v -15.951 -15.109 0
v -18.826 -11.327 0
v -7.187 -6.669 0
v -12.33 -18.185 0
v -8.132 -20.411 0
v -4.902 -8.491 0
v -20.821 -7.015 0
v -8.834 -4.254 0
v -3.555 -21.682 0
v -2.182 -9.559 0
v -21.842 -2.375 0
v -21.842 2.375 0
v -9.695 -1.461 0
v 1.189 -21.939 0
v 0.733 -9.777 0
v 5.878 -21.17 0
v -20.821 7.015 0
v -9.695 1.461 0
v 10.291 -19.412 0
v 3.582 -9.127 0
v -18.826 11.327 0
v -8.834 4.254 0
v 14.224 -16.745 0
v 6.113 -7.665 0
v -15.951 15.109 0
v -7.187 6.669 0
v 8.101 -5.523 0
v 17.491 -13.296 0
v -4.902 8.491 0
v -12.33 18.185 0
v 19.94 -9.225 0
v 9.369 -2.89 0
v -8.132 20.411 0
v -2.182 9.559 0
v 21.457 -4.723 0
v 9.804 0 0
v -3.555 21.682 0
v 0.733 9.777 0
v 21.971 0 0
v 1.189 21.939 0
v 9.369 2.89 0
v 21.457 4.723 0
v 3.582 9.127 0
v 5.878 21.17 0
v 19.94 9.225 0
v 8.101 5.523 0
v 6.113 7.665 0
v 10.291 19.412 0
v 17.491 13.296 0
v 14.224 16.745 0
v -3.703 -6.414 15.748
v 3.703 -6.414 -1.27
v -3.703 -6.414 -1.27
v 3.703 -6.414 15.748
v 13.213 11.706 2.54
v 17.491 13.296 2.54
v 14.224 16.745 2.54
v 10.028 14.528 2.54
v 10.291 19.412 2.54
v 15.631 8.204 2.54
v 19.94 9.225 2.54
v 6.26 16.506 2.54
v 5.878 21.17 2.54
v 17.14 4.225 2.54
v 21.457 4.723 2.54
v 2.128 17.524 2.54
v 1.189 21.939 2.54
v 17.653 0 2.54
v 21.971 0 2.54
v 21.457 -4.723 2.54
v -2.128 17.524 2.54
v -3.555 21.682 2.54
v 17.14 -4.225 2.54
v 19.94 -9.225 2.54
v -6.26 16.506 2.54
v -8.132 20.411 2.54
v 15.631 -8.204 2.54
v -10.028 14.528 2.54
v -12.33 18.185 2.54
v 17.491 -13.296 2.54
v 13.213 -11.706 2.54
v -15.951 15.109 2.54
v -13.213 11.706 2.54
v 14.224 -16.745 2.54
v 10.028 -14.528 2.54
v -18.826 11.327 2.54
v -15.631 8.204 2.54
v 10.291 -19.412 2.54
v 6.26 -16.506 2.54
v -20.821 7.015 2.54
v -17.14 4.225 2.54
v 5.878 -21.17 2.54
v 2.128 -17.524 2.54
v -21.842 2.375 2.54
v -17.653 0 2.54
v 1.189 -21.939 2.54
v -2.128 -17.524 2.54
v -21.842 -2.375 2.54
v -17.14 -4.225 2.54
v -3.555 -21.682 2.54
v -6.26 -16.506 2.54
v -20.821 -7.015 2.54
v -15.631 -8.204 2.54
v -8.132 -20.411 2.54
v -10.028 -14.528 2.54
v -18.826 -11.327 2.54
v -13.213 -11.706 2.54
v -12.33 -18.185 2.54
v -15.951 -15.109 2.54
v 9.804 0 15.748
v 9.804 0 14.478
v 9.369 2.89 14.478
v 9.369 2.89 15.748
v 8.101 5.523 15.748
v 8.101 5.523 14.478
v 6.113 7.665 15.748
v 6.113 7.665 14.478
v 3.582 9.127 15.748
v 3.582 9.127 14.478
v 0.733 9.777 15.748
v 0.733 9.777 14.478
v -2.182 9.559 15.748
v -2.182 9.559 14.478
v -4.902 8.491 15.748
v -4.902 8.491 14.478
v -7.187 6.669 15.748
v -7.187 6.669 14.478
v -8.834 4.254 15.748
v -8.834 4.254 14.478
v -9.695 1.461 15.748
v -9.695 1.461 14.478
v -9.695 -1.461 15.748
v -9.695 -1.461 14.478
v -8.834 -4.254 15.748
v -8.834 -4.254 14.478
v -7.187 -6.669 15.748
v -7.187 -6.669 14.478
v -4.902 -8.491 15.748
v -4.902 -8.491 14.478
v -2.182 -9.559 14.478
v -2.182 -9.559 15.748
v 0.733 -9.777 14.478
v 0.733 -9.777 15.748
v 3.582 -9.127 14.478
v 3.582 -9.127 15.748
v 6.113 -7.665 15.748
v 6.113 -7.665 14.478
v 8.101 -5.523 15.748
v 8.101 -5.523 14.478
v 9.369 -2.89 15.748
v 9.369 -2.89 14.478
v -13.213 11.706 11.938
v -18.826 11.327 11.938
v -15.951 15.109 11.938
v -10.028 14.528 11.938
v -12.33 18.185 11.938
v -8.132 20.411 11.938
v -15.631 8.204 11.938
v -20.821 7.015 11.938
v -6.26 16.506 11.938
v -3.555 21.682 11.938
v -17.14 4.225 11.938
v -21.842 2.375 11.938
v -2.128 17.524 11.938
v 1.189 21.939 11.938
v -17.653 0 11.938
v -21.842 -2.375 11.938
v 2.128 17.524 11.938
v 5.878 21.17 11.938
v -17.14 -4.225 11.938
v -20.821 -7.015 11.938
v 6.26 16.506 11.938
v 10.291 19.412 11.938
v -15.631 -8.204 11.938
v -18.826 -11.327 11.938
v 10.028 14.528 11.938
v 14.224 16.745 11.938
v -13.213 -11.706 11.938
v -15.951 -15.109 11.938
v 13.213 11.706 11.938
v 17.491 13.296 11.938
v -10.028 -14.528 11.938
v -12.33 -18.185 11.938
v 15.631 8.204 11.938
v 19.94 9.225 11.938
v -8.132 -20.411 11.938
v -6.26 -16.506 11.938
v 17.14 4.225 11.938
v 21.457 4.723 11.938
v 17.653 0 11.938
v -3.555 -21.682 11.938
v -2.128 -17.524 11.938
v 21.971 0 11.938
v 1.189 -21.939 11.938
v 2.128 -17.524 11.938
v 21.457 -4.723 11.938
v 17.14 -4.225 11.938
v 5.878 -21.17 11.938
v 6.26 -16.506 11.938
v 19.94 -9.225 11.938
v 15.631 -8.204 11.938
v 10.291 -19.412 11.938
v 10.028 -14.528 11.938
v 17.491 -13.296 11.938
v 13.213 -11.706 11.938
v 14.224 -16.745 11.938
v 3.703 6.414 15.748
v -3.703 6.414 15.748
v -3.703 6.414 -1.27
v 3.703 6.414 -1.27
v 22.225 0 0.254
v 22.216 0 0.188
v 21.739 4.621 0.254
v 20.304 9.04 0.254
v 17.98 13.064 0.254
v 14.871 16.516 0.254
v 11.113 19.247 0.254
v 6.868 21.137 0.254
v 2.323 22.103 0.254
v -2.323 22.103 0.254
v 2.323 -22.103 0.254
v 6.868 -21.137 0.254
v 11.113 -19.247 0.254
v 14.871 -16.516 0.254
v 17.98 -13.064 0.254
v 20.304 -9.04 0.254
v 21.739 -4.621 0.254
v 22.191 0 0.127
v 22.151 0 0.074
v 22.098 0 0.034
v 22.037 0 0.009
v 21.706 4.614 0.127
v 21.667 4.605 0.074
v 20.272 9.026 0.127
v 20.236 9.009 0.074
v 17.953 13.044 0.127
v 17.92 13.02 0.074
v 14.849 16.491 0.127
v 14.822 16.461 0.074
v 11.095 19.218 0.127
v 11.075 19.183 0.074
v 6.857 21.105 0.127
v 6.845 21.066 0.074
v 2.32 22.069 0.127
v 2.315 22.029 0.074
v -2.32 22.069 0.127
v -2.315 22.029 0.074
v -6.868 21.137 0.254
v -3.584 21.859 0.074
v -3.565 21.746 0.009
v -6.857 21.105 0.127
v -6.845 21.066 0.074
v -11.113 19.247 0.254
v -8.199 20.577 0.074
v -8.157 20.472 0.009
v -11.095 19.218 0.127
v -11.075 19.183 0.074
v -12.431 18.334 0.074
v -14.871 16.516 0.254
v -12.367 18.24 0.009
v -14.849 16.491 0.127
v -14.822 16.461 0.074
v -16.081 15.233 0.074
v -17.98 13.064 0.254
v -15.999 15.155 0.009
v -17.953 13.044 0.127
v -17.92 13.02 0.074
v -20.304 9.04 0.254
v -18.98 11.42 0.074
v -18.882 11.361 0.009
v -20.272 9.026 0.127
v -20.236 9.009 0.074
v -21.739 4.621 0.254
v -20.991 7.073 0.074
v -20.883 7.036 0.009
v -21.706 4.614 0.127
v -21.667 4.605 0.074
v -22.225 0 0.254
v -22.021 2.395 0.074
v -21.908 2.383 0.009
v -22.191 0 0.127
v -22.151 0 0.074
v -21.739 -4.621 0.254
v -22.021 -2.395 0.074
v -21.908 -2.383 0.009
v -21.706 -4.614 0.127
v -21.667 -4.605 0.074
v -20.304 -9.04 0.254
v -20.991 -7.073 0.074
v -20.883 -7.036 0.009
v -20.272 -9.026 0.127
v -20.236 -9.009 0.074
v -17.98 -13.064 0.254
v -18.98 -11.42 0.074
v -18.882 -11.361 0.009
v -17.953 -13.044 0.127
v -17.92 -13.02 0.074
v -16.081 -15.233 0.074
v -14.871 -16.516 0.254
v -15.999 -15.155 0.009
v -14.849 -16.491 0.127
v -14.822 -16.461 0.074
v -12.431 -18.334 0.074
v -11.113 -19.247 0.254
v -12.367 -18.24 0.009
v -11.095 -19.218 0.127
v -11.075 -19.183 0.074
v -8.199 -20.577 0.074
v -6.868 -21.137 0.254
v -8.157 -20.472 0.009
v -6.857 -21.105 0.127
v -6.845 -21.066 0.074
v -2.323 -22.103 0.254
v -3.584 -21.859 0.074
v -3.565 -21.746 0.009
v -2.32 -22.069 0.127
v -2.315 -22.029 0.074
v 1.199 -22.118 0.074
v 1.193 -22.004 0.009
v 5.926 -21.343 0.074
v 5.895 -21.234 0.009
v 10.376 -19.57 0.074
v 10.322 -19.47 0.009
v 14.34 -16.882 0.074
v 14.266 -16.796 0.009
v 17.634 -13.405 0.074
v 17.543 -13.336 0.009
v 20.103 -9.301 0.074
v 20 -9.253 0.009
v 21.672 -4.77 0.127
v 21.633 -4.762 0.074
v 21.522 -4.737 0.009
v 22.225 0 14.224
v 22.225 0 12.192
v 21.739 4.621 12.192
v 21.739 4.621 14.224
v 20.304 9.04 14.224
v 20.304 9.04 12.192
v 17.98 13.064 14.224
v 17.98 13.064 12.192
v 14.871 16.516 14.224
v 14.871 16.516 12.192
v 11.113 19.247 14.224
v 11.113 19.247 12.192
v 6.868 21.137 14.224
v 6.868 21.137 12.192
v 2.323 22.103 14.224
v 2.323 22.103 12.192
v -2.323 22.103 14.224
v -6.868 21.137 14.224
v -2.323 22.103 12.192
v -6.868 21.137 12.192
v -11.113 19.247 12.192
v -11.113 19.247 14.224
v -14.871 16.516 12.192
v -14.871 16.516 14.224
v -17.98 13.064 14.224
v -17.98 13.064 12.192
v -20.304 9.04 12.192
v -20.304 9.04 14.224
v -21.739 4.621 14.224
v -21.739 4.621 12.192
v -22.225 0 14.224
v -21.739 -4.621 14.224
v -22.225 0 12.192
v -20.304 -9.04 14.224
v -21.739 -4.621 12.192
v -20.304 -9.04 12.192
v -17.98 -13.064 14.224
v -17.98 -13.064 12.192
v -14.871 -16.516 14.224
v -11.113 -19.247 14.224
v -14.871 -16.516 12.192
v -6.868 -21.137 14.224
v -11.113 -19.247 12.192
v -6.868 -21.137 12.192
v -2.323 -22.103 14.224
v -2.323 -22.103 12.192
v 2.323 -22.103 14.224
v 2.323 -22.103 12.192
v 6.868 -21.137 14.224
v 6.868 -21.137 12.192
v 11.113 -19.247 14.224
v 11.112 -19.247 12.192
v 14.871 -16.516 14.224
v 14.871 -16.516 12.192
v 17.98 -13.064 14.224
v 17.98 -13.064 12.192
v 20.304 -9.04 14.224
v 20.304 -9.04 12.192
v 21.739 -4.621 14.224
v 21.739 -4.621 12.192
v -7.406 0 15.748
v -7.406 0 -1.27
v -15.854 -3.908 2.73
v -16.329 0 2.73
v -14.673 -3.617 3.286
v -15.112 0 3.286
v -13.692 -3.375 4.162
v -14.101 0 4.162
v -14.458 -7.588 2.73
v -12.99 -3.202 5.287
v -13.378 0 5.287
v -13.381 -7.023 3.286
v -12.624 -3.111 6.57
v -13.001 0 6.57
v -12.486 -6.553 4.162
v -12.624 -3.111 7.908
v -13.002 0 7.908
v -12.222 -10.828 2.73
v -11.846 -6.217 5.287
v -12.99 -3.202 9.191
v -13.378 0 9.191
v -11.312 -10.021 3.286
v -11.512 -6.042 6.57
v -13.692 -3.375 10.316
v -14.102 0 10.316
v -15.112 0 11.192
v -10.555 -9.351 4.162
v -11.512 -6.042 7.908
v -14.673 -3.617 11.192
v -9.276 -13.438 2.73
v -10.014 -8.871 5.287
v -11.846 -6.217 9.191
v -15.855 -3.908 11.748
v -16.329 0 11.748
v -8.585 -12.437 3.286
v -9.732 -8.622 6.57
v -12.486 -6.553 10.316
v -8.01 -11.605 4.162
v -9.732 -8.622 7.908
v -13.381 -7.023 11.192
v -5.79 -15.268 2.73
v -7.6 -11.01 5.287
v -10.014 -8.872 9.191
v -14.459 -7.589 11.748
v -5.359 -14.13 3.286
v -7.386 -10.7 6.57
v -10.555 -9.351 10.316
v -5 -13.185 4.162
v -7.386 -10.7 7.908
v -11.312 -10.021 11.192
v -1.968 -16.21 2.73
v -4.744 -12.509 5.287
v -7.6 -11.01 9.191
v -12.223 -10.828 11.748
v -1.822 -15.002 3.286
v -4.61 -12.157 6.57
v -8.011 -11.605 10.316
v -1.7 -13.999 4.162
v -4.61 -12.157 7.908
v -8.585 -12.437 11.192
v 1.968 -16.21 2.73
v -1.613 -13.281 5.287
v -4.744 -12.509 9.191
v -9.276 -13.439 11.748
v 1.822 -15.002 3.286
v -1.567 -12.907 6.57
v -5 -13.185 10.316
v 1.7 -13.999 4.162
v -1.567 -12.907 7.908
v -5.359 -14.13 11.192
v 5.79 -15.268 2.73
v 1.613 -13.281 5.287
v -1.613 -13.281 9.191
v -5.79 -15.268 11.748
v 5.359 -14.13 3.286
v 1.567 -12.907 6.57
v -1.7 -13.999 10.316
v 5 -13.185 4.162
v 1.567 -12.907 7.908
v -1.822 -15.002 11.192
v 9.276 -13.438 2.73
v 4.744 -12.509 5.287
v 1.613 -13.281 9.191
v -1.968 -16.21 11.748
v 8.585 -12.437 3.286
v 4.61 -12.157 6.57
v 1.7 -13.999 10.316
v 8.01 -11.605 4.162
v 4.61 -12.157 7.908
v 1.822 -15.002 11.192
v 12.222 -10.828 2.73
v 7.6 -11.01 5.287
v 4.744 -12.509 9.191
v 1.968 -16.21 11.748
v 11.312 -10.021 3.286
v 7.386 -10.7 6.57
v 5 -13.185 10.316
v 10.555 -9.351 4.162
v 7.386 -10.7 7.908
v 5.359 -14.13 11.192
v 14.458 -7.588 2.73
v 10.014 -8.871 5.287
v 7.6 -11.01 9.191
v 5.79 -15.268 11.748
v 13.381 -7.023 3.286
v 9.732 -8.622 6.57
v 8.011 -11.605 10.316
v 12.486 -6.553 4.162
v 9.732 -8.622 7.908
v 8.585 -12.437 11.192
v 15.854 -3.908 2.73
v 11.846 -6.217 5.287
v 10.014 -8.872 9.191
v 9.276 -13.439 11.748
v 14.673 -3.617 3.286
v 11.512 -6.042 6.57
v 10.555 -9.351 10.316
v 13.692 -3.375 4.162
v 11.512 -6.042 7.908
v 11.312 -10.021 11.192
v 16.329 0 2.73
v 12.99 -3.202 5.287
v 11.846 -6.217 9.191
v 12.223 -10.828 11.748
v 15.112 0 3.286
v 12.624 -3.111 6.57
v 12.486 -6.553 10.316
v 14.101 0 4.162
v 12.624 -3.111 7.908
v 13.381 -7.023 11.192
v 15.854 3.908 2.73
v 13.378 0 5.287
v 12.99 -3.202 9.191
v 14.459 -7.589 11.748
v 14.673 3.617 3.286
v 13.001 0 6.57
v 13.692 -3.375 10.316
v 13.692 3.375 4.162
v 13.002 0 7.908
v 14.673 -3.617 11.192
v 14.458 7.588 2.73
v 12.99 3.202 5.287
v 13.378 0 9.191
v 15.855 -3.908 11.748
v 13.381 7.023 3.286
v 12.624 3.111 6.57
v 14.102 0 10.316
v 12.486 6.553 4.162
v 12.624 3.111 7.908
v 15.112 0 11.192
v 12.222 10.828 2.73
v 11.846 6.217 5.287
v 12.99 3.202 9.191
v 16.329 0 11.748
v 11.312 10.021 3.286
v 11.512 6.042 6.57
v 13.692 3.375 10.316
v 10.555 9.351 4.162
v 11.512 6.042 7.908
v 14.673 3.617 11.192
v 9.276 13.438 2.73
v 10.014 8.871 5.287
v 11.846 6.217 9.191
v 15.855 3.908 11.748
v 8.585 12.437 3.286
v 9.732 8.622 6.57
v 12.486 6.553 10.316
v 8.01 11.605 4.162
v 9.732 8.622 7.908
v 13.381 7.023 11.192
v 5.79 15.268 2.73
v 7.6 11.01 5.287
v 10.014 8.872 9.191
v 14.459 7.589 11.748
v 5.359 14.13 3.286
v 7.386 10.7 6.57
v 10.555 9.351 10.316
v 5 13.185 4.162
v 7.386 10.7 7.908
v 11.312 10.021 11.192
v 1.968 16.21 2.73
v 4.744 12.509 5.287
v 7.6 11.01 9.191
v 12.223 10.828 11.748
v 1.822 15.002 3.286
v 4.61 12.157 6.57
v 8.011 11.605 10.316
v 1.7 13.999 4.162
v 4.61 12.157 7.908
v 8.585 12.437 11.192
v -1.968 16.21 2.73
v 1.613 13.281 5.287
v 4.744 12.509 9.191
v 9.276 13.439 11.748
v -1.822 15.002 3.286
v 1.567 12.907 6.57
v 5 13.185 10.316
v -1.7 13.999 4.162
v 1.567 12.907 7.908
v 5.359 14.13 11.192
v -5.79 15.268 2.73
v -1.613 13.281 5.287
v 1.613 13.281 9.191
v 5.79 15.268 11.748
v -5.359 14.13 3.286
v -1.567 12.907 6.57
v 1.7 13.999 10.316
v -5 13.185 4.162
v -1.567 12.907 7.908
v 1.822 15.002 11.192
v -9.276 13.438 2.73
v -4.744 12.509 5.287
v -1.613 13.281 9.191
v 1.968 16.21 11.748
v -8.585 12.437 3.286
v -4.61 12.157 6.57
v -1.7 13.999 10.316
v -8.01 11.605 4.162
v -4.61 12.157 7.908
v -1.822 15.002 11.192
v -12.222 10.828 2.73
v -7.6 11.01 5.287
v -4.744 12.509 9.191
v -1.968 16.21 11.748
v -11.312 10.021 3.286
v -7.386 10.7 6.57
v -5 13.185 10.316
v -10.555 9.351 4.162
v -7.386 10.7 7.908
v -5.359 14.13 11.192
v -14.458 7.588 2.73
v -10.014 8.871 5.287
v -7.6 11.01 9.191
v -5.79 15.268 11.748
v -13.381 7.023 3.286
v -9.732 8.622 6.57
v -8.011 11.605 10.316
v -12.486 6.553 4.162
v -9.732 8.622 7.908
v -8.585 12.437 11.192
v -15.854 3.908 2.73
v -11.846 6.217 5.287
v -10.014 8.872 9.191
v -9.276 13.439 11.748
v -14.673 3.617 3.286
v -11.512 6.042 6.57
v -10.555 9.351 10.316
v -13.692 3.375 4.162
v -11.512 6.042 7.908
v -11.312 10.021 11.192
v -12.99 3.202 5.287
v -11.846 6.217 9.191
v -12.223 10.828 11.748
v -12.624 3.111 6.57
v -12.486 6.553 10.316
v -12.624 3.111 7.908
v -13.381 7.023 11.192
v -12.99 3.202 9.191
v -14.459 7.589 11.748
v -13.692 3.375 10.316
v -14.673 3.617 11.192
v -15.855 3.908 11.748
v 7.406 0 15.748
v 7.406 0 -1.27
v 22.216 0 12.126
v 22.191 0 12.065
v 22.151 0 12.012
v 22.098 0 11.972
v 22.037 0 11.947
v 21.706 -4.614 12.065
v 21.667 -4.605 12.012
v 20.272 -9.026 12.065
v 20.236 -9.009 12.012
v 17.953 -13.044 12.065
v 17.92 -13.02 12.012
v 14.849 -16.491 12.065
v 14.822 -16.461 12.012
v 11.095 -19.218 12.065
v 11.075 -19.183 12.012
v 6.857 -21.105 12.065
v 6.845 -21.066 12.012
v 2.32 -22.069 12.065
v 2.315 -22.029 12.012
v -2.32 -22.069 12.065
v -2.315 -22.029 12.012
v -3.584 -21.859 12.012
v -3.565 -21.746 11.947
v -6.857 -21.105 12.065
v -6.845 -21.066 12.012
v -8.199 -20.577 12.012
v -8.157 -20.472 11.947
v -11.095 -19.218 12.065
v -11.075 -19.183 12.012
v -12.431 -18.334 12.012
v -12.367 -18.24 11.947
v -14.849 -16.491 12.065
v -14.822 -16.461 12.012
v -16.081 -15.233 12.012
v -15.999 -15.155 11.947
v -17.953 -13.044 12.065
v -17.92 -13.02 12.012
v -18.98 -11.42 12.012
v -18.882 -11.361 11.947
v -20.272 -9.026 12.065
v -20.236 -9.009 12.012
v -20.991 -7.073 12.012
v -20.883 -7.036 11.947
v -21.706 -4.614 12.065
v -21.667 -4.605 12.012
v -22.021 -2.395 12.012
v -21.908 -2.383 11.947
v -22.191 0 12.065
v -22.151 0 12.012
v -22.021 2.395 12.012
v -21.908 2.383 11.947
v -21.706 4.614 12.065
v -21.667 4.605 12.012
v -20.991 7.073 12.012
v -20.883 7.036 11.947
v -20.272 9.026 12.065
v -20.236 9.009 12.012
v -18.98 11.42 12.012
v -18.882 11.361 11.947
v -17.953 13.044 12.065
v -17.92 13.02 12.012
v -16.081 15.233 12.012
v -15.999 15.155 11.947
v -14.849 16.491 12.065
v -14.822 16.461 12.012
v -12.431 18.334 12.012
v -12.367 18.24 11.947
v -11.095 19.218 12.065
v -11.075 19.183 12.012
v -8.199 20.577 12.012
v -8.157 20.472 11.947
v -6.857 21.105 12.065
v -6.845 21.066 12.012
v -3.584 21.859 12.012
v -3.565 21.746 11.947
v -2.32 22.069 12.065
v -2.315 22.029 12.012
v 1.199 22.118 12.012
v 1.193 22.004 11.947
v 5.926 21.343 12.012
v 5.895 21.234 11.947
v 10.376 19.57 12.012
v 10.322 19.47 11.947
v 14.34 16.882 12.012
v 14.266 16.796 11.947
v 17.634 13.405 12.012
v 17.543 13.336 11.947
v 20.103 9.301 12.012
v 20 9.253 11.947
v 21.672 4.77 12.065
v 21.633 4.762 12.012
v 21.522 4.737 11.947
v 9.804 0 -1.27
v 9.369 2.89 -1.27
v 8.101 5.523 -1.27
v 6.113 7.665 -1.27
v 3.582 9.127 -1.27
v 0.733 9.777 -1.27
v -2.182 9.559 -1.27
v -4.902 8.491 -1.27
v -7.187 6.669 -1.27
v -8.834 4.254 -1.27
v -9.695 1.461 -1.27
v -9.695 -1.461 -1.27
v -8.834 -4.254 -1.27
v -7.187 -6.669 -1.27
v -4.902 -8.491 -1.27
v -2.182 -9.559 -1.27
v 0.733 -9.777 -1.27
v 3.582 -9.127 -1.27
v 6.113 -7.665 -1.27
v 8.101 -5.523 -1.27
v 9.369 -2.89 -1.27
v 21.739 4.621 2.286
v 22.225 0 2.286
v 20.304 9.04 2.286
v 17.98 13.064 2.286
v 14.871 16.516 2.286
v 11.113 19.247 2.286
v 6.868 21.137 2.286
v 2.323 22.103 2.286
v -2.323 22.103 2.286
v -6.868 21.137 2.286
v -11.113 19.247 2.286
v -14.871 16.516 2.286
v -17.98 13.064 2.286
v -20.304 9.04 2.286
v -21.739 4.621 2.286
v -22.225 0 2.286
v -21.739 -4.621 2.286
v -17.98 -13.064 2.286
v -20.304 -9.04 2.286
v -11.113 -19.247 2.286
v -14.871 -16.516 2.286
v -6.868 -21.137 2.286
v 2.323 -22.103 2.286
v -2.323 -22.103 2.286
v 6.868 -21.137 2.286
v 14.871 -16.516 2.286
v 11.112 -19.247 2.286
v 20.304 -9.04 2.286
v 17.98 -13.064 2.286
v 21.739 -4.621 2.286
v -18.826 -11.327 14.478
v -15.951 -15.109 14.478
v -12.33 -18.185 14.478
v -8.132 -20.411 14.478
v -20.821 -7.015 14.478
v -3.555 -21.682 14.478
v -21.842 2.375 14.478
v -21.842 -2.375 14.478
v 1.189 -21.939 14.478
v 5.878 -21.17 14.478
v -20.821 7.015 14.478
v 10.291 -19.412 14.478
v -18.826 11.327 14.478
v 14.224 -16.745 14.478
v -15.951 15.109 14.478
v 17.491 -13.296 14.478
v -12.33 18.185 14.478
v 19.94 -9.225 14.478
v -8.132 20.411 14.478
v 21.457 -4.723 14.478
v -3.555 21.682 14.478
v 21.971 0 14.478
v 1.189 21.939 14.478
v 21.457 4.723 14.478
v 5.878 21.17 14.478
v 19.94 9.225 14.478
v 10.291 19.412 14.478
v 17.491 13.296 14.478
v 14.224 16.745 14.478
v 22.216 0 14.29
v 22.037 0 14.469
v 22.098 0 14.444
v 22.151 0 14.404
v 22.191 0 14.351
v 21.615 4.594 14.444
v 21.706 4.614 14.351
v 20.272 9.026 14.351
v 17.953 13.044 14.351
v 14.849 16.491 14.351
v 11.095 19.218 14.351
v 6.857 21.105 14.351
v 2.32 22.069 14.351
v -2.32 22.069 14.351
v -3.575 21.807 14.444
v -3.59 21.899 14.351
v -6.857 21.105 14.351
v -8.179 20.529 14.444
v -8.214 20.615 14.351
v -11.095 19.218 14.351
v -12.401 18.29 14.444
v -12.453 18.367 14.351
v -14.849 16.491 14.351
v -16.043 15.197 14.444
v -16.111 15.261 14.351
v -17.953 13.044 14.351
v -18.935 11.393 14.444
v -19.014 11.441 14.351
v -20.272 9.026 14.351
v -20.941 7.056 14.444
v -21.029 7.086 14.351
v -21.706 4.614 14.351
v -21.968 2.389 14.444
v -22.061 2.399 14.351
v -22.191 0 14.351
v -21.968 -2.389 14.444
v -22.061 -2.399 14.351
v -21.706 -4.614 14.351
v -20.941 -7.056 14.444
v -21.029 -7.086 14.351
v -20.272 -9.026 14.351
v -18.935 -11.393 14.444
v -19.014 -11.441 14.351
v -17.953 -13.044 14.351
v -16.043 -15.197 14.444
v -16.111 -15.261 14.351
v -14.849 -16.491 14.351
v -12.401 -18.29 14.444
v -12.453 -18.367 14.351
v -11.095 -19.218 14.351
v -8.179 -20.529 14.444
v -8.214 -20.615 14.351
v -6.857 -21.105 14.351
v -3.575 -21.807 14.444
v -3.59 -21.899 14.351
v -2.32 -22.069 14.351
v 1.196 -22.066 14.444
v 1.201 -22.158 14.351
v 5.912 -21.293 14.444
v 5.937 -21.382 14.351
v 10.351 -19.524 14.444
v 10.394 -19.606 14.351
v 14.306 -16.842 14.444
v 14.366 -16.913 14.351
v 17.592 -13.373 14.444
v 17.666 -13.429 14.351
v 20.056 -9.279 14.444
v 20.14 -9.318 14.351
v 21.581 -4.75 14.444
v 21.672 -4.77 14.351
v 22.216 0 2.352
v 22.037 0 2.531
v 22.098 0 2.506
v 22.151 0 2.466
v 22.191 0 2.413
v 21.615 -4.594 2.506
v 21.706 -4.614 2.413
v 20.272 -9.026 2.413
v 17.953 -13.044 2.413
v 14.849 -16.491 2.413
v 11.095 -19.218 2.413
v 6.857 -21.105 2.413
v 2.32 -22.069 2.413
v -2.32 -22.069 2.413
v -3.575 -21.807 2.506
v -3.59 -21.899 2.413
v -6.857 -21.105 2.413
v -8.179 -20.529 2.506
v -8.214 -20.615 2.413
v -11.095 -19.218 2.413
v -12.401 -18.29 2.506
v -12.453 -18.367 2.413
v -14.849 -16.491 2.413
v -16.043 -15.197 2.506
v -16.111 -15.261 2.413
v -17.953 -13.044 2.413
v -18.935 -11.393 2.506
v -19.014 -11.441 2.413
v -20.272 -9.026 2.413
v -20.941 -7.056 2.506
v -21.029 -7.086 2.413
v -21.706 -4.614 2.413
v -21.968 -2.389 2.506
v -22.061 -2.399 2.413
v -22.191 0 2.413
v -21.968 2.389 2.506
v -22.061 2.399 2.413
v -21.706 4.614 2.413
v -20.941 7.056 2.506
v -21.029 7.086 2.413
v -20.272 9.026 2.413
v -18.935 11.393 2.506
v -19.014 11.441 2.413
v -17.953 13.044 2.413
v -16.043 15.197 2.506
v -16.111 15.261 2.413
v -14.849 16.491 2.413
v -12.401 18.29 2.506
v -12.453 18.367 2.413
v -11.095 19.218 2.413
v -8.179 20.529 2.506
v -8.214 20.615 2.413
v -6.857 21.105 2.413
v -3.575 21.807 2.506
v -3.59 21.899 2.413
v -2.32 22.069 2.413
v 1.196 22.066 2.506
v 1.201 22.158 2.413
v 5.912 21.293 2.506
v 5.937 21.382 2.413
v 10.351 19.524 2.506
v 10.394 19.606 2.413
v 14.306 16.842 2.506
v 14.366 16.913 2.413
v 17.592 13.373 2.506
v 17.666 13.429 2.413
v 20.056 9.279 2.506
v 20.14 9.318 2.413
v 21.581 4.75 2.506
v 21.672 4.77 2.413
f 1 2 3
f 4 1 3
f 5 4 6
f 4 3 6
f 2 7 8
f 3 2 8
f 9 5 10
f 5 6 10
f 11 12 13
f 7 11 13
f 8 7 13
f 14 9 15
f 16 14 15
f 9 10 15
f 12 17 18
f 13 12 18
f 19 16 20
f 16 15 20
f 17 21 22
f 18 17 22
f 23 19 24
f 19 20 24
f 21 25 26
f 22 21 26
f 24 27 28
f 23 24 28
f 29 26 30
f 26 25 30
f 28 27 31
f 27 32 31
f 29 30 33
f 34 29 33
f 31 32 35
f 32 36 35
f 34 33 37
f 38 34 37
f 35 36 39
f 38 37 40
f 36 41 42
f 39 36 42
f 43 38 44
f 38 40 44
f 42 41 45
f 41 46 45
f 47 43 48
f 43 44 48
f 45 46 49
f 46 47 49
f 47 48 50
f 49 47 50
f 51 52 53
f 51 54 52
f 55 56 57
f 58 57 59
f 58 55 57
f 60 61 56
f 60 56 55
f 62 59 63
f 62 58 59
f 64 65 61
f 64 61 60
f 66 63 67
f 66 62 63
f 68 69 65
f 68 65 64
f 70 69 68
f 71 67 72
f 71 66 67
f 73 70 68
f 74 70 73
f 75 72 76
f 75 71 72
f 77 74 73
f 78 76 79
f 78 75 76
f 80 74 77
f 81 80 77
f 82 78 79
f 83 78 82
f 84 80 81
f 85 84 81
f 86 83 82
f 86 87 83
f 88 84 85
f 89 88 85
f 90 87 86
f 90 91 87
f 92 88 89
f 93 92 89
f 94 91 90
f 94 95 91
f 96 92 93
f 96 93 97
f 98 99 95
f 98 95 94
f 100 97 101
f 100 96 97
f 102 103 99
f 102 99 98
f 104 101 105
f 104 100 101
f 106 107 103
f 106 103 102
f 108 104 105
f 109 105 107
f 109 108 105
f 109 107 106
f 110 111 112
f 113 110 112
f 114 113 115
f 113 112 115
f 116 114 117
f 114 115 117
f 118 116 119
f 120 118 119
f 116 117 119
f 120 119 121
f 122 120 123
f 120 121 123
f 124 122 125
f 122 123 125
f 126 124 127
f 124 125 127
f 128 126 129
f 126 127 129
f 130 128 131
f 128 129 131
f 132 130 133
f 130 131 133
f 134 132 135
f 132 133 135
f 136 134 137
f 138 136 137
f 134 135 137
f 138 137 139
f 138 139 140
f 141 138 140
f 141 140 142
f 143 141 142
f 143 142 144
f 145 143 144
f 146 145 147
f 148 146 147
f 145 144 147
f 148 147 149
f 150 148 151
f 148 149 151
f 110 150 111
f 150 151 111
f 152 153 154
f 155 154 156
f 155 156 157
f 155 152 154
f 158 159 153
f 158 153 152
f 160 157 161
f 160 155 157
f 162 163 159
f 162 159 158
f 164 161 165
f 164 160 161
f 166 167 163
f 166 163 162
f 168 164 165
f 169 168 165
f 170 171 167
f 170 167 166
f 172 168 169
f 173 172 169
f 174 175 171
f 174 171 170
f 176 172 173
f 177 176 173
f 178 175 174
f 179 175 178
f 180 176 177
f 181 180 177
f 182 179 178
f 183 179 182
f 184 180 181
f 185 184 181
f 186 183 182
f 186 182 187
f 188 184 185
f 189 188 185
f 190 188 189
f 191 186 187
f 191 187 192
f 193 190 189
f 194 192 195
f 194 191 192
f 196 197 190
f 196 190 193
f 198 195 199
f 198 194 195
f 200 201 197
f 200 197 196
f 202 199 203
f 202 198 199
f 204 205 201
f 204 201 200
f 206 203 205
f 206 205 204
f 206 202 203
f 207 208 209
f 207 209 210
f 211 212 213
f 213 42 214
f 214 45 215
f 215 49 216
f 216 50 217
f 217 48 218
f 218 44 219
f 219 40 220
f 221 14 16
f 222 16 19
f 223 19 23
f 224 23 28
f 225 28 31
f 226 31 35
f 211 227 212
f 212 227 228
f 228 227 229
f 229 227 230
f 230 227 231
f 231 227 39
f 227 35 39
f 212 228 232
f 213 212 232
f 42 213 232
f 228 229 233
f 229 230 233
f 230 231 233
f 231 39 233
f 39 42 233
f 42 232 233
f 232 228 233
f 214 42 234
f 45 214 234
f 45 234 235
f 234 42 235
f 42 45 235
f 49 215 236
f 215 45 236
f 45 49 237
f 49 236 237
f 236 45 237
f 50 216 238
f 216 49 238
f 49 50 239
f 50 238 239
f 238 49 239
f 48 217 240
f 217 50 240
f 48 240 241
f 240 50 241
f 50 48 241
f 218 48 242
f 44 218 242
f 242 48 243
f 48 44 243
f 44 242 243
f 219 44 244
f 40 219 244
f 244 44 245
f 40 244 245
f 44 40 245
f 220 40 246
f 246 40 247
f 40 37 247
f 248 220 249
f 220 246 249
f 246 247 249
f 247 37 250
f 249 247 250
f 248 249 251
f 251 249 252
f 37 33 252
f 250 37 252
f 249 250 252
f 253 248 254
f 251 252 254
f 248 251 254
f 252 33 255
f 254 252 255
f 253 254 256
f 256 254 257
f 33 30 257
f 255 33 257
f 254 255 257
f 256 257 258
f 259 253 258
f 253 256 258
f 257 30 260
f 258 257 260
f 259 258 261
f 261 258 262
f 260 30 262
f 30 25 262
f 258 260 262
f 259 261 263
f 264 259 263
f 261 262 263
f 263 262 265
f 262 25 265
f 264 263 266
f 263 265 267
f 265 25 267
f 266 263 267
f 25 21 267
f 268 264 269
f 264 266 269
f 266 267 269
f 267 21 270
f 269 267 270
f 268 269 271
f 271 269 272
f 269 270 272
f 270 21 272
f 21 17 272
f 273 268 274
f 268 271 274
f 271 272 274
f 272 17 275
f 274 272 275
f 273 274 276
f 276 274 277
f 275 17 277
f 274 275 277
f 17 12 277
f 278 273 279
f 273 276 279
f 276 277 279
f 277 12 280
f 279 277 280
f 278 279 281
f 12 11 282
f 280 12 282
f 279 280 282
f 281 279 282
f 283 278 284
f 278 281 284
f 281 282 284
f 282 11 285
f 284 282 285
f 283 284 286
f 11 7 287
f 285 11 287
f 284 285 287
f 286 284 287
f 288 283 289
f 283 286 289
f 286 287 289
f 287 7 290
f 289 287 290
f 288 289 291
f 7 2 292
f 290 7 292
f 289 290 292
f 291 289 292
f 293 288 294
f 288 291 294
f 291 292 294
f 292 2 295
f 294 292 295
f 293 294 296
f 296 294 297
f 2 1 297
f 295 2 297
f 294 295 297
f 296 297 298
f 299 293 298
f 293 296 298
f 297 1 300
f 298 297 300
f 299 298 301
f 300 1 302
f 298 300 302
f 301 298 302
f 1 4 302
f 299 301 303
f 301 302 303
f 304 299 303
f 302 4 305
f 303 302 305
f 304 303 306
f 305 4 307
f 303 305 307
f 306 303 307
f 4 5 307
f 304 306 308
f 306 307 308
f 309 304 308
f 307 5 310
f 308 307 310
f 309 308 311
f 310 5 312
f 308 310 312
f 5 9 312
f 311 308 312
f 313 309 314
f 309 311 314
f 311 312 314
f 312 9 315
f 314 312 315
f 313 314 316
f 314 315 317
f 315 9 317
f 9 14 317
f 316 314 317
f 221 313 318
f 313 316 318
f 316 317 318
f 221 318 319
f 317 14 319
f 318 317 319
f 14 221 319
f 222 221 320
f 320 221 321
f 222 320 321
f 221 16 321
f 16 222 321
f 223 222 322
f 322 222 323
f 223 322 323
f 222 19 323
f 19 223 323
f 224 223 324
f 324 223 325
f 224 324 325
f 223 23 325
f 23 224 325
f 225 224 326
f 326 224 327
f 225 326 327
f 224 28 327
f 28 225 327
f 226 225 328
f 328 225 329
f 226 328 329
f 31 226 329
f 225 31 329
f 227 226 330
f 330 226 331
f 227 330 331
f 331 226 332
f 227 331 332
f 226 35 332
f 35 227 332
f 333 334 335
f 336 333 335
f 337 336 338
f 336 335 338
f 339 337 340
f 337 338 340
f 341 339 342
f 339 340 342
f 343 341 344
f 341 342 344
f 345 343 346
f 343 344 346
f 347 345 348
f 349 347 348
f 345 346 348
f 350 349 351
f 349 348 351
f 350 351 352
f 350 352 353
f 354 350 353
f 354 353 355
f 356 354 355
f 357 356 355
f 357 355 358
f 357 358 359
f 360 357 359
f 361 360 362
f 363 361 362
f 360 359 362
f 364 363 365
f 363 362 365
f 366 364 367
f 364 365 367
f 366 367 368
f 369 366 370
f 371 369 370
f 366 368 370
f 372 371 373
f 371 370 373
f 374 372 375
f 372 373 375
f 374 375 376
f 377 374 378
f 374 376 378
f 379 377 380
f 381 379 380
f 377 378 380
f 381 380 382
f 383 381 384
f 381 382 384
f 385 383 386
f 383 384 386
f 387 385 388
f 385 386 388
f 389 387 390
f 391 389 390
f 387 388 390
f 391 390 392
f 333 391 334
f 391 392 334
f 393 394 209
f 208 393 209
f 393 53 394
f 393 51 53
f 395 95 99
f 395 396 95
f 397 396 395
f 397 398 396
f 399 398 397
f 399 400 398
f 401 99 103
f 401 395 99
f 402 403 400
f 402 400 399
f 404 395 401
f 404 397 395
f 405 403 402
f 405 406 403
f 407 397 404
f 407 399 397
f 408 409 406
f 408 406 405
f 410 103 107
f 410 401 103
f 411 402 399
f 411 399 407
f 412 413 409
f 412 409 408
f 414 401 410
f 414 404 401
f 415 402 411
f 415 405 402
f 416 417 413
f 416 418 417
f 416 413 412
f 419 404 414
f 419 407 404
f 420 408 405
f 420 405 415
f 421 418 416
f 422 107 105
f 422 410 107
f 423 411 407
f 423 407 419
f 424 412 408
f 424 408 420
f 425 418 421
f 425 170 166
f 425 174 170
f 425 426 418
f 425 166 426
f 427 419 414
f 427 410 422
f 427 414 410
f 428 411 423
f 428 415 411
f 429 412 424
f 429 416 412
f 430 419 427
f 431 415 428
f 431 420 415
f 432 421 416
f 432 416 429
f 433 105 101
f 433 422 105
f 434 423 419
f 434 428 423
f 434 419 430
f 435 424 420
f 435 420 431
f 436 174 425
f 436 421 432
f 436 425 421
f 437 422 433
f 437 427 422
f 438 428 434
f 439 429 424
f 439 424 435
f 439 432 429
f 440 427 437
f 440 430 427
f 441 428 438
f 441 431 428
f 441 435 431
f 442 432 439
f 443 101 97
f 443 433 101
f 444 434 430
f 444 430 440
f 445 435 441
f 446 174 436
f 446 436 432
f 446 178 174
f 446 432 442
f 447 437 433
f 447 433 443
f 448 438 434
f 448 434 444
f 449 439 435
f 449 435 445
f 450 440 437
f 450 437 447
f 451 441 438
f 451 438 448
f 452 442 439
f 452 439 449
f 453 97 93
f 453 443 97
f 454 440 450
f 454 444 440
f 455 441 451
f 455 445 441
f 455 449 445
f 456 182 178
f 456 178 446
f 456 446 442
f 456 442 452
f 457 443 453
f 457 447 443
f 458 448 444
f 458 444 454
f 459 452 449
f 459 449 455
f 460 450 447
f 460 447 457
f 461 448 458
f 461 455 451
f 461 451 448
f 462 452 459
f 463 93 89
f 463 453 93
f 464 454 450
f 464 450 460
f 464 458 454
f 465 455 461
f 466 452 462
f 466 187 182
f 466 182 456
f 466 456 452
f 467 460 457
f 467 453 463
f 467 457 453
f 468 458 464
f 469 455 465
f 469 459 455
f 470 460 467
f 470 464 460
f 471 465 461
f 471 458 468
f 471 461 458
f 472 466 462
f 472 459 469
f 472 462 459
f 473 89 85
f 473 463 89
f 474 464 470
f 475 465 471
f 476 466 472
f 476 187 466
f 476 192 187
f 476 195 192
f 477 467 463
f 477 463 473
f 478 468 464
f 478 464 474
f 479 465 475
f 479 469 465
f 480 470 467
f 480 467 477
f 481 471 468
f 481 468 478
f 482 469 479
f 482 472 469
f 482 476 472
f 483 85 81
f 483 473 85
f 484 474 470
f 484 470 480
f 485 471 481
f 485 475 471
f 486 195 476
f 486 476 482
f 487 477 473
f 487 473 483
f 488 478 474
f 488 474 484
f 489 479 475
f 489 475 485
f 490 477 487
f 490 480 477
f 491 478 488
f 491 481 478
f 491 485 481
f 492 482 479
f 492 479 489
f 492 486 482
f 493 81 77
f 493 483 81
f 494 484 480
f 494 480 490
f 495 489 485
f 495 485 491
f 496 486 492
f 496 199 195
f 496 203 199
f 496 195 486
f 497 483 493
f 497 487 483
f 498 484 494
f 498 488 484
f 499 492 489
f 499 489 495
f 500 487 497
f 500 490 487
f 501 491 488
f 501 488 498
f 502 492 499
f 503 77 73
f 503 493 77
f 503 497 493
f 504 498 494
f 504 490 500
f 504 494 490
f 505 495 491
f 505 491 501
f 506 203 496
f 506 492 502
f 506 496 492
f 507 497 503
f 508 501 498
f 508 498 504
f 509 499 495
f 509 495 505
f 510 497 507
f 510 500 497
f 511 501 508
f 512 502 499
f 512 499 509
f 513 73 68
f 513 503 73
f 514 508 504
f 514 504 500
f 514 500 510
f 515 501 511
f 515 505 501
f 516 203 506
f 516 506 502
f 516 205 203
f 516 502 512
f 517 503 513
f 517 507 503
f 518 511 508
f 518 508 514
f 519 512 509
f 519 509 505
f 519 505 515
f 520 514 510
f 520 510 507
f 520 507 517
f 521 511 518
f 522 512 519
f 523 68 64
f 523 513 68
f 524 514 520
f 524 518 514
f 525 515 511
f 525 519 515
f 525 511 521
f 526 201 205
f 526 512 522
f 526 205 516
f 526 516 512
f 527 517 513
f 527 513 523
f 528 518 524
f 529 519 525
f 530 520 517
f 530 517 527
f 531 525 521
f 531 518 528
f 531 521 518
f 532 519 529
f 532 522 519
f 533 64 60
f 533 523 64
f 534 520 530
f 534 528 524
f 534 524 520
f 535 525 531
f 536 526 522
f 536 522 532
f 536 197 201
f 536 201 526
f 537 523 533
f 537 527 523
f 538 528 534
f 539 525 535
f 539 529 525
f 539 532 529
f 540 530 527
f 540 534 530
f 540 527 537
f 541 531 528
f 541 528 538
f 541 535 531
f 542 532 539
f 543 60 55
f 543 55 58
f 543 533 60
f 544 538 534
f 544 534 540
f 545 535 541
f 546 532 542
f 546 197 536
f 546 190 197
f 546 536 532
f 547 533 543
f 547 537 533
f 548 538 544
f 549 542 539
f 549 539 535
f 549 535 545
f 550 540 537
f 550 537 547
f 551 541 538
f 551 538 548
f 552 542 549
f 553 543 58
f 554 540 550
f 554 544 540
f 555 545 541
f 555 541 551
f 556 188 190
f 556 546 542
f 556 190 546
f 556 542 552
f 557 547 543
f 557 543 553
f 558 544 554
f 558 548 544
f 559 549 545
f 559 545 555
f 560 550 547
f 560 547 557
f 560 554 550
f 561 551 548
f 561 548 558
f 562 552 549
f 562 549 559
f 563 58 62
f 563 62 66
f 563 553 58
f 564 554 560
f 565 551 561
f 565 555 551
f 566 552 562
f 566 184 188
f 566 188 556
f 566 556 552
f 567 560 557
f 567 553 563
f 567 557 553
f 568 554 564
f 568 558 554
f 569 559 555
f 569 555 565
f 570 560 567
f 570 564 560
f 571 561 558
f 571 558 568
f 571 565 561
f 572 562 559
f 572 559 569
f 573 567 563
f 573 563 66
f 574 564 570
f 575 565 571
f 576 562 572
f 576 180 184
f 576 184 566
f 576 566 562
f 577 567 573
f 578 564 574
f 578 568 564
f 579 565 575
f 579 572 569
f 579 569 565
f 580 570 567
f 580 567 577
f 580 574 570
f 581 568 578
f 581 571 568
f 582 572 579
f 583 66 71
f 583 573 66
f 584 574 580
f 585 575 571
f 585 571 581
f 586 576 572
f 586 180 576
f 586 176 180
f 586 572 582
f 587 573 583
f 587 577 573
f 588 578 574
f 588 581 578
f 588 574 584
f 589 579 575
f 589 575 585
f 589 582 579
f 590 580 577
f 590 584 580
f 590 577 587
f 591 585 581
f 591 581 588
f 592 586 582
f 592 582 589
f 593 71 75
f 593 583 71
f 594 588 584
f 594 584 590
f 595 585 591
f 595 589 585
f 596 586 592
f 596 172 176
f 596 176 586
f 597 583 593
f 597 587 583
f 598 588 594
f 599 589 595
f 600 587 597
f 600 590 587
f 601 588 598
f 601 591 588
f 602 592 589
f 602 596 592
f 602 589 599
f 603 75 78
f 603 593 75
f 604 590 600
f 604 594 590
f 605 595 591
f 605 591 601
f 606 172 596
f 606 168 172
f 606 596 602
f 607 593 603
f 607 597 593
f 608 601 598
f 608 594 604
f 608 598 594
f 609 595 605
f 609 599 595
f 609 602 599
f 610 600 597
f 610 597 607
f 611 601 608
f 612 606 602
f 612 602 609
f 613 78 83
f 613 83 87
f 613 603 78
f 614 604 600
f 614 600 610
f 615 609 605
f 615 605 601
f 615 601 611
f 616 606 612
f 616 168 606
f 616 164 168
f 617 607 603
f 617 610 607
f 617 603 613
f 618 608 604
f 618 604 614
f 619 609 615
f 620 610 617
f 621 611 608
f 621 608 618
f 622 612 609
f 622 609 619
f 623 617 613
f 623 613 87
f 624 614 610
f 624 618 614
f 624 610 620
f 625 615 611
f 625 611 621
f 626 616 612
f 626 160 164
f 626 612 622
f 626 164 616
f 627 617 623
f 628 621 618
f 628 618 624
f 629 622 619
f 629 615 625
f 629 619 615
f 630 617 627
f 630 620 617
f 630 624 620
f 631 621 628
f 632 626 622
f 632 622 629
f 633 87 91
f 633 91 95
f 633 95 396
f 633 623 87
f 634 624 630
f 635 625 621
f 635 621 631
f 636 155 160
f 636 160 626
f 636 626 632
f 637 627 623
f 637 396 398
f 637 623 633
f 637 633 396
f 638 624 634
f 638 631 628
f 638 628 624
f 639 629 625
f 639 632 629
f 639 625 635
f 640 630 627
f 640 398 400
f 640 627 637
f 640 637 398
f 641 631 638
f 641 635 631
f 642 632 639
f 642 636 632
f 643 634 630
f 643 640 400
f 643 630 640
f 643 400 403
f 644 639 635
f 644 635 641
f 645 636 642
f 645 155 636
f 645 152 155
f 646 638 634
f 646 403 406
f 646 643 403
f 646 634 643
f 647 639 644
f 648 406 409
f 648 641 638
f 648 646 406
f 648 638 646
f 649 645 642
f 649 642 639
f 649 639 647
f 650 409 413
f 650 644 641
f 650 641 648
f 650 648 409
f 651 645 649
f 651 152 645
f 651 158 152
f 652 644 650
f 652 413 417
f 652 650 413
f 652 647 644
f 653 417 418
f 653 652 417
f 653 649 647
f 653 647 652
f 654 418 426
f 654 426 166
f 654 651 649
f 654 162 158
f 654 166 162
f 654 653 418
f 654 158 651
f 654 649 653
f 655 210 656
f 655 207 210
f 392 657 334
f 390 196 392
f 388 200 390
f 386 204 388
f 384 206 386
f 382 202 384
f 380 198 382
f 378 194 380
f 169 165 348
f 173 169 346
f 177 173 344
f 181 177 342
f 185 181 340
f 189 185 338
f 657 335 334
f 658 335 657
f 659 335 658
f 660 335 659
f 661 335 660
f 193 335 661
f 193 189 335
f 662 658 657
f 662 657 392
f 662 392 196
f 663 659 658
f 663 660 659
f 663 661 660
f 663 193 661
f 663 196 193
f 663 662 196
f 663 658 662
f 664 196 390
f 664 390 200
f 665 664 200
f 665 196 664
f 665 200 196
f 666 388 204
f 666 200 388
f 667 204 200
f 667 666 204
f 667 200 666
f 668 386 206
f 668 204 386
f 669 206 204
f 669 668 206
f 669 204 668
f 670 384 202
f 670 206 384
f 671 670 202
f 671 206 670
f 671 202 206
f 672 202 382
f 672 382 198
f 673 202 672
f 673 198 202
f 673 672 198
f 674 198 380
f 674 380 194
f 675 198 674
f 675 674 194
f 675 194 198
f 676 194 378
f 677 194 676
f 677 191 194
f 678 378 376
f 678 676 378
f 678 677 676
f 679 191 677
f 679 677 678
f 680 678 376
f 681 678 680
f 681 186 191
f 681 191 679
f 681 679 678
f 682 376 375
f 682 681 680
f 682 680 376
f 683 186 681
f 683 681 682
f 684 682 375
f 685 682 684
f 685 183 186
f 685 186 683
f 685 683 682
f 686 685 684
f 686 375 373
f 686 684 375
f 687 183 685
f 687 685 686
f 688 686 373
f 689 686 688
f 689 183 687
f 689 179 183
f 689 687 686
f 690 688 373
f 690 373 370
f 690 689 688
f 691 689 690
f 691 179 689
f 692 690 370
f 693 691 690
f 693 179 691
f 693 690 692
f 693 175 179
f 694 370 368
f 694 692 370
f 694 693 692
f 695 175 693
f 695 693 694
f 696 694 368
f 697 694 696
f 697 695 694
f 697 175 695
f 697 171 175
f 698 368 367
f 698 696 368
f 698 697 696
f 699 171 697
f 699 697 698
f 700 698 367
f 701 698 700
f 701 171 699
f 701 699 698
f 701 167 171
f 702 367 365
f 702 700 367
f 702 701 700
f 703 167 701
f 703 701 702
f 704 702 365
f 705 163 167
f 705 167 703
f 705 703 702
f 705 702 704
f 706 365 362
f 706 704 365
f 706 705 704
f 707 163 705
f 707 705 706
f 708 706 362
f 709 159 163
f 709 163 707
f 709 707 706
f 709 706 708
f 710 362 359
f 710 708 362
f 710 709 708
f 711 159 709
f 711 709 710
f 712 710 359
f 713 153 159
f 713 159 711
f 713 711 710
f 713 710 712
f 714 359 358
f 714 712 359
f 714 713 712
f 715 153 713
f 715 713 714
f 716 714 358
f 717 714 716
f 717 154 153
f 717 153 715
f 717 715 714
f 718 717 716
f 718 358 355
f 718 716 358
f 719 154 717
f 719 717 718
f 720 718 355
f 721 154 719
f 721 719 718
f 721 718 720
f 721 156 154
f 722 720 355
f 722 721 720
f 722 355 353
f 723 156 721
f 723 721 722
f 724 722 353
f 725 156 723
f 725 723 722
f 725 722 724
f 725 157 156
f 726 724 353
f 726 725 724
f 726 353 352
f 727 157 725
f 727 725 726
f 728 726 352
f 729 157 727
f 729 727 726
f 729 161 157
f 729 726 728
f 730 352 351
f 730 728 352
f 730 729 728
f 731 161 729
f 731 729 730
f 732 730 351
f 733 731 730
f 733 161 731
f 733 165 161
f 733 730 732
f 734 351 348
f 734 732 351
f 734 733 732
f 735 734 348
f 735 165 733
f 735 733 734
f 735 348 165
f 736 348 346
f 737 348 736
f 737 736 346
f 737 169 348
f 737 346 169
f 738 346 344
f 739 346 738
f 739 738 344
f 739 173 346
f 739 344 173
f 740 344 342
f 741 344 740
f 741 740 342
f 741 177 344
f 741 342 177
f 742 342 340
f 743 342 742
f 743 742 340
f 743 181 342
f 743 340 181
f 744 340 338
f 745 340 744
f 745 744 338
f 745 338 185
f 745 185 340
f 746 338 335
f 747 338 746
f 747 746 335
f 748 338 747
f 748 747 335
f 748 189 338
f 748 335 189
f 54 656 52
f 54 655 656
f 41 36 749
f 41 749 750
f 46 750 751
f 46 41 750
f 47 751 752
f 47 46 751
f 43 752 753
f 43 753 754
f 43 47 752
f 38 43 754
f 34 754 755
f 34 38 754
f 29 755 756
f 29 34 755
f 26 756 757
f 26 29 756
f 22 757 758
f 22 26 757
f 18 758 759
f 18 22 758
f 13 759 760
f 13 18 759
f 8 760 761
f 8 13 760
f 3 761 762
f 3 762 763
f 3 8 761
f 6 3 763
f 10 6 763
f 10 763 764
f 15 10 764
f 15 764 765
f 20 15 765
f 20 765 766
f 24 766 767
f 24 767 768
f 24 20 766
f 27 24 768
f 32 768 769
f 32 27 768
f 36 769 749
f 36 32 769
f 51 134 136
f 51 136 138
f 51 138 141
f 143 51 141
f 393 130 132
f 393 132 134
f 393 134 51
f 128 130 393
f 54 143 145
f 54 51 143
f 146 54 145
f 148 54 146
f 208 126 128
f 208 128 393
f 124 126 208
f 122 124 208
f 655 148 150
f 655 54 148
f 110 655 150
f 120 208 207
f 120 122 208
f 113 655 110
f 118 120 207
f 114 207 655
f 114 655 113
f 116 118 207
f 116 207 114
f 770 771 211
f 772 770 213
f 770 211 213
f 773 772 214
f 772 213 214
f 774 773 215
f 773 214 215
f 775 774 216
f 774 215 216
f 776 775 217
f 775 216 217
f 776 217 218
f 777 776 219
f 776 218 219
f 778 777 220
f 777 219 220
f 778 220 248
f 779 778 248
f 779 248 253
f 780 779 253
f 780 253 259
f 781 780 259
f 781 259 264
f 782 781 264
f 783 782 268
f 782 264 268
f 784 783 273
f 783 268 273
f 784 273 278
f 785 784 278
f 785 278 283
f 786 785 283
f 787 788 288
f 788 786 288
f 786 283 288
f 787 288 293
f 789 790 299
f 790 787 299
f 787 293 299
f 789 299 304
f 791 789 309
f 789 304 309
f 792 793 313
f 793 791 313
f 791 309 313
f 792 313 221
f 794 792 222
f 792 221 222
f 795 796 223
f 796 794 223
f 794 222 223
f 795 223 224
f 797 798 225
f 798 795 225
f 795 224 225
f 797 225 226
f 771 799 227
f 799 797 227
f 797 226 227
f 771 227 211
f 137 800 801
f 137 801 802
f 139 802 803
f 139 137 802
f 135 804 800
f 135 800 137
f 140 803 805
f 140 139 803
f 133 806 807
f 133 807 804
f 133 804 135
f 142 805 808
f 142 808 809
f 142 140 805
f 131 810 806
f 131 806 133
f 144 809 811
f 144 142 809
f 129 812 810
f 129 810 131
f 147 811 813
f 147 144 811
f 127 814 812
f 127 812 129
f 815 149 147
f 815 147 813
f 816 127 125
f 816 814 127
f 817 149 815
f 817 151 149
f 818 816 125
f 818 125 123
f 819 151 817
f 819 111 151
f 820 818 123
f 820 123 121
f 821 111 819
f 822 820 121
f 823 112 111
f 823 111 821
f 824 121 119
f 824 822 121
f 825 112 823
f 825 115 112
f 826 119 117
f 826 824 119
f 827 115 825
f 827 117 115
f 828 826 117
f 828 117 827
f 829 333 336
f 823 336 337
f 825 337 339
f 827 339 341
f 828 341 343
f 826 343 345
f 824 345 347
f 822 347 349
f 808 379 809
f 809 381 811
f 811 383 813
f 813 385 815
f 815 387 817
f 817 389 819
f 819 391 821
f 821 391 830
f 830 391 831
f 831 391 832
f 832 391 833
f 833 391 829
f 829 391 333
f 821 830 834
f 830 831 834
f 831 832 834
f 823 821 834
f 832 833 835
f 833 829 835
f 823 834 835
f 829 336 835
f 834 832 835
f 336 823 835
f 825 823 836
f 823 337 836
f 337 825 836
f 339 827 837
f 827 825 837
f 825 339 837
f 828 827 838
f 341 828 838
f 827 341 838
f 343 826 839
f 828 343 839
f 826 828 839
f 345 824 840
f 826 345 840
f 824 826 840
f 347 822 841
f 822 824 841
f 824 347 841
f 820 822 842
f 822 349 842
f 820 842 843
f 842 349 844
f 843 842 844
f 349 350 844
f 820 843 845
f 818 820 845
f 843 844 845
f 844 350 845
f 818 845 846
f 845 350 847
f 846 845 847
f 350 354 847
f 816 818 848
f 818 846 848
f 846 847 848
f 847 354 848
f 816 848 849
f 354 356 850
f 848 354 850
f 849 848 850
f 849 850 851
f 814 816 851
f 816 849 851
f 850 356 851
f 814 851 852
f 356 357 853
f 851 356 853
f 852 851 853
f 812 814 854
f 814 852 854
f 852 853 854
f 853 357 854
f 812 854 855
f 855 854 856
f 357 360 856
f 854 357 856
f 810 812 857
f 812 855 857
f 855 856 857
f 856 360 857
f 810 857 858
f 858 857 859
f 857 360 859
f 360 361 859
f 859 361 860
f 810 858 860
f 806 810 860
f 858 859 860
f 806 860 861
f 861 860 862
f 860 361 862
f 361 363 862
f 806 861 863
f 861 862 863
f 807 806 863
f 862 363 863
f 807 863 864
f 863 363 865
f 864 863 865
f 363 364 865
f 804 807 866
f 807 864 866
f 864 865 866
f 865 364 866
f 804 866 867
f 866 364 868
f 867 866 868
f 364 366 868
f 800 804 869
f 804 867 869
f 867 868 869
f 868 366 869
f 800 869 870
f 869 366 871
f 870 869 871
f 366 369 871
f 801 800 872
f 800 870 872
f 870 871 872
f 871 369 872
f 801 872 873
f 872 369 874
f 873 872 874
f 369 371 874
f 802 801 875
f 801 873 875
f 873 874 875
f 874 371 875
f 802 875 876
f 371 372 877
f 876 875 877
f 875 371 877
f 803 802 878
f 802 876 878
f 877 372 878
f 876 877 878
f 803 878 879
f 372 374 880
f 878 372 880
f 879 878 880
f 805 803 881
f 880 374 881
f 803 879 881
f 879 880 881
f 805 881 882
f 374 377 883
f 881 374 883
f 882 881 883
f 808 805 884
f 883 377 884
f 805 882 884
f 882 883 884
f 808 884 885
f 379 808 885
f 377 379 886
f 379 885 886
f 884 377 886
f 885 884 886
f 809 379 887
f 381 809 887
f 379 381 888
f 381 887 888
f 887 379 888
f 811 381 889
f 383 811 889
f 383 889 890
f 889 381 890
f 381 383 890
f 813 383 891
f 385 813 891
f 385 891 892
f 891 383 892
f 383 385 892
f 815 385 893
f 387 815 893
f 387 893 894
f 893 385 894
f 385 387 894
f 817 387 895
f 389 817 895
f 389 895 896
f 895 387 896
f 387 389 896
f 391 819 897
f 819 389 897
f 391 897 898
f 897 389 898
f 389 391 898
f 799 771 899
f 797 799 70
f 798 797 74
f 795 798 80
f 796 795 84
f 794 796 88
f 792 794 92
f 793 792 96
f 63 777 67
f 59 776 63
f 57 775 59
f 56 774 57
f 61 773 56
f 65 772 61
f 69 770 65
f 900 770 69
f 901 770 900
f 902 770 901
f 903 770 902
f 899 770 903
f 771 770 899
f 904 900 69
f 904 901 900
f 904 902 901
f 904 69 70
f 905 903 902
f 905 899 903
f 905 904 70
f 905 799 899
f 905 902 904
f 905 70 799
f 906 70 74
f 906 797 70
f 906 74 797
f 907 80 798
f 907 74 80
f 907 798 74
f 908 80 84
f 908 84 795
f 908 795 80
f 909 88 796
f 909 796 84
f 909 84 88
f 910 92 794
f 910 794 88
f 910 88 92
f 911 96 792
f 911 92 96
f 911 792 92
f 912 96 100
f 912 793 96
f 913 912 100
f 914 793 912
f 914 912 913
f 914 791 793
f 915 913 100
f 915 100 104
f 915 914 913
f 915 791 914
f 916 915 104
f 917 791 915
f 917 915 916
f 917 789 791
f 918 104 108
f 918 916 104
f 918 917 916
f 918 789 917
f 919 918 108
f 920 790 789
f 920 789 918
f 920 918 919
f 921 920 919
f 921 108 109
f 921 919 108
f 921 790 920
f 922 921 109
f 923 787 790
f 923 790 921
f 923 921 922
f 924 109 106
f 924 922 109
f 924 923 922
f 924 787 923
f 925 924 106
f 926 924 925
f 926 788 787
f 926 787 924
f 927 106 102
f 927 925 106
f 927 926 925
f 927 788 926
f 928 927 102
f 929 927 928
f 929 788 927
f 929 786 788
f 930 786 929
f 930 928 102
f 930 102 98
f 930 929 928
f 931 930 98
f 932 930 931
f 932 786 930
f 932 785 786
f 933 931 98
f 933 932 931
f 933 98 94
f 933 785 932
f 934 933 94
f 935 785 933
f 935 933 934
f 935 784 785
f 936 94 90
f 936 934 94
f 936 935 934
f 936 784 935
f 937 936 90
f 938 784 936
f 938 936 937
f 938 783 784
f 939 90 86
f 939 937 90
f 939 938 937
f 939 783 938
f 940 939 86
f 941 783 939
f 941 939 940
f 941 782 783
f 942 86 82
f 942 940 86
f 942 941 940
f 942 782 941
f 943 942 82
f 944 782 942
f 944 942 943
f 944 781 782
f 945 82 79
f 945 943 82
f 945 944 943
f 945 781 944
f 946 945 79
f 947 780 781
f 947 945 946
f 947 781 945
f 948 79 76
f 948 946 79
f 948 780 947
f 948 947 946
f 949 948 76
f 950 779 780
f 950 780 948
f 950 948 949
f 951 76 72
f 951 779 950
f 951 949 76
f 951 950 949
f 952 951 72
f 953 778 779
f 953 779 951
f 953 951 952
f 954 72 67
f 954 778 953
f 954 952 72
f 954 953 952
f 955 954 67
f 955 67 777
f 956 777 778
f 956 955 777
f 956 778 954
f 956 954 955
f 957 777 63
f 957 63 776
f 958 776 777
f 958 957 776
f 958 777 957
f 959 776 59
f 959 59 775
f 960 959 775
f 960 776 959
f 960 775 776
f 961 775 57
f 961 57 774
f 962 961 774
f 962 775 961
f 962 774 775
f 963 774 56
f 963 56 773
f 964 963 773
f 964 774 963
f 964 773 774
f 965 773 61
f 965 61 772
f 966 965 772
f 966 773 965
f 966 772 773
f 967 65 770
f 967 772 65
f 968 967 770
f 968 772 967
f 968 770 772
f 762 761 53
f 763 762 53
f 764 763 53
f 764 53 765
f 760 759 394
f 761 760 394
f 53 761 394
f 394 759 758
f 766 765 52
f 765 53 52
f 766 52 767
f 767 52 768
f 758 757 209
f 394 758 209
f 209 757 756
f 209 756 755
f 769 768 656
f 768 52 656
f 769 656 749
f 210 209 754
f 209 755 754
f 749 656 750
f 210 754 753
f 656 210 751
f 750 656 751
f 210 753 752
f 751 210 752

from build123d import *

# Parameters (mm, degrees)
F0_R     = 22.225
F1_DEPTH = 14.478
F4_R     = 9.8044812149
F5_DEPTH = 1.27
F7_R     = 0.254


# Not quite as in the source:
# - a pattern or mirror of a feature is missing from the dataset's text; its kind, count and spacing are read off the source's solid


with BuildPart() as f1:
    # F0 (on Top) → F1 (new body)
    with BuildSketch(Plane.XY):
        Circle(F0_R)
        Polygon((-7.4056719029, 0), (-3.7028359514, 6.4135), (3.7028359514, 6.4135), (7.4056719029, 0), (3.7028359514, -6.4135), (-3.7028359514, -6.4135), align=None, mode=Mode.SUBTRACT)
    extrude(amount=F1_DEPTH)

    # F2 (on Front) → F3 (revolve, cut)
    with BuildSketch(Plane.XZ):
        with BuildLine():
            Line((-22.225, 11.938), (-22.225, 2.54))
            Line((-22.225, 2.54), (-17.6526800774, 2.54))
            ThreePointArc((-17.6526800774, 2.54), (-12.9536800747, 7.2391599667), (-17.653, 11.938))
            Line((-17.653, 11.938), (-22.225, 11.938))
        make_face()
    revolve(axis=Axis((0, 0, 14.478), (0, 0, 1)), mode=Mode.SUBTRACT)

    # F4 (on face) → F5 (join)
    with BuildSketch(Plane.XY.offset(14.478)):
        Circle(F4_R)
        Polygon((-3.7028359514, 6.4135), (3.7028359514, 6.4135), (7.4056719029, 0), (3.7028359514, -6.4135), (-3.7028359514, -6.4135), (-7.4056719029, 0), align=None, mode=Mode.SUBTRACT)
    f5 = extrude(amount=F5_DEPTH)

    # F5_copies: F5 across plane
    add(f5.mirror(Plane(origin=(0, 0, 7.239), x_dir=(-1, 0, 0), z_dir=(0, 0, -1))))

    # F7
    f7_edges = [f1.edges().sort_by_distance(p)[0] for p in [
        (-22.225, 0, 0),
        (-22.225, 0, 14.478),
        (-22.225, 0, 11.938),
        (22.225, 0, 1.27),
        (-22.225, 0, 2.54),
    ]]
    fillet(f7_edges, radius=F7_R)


solid = f1.part
